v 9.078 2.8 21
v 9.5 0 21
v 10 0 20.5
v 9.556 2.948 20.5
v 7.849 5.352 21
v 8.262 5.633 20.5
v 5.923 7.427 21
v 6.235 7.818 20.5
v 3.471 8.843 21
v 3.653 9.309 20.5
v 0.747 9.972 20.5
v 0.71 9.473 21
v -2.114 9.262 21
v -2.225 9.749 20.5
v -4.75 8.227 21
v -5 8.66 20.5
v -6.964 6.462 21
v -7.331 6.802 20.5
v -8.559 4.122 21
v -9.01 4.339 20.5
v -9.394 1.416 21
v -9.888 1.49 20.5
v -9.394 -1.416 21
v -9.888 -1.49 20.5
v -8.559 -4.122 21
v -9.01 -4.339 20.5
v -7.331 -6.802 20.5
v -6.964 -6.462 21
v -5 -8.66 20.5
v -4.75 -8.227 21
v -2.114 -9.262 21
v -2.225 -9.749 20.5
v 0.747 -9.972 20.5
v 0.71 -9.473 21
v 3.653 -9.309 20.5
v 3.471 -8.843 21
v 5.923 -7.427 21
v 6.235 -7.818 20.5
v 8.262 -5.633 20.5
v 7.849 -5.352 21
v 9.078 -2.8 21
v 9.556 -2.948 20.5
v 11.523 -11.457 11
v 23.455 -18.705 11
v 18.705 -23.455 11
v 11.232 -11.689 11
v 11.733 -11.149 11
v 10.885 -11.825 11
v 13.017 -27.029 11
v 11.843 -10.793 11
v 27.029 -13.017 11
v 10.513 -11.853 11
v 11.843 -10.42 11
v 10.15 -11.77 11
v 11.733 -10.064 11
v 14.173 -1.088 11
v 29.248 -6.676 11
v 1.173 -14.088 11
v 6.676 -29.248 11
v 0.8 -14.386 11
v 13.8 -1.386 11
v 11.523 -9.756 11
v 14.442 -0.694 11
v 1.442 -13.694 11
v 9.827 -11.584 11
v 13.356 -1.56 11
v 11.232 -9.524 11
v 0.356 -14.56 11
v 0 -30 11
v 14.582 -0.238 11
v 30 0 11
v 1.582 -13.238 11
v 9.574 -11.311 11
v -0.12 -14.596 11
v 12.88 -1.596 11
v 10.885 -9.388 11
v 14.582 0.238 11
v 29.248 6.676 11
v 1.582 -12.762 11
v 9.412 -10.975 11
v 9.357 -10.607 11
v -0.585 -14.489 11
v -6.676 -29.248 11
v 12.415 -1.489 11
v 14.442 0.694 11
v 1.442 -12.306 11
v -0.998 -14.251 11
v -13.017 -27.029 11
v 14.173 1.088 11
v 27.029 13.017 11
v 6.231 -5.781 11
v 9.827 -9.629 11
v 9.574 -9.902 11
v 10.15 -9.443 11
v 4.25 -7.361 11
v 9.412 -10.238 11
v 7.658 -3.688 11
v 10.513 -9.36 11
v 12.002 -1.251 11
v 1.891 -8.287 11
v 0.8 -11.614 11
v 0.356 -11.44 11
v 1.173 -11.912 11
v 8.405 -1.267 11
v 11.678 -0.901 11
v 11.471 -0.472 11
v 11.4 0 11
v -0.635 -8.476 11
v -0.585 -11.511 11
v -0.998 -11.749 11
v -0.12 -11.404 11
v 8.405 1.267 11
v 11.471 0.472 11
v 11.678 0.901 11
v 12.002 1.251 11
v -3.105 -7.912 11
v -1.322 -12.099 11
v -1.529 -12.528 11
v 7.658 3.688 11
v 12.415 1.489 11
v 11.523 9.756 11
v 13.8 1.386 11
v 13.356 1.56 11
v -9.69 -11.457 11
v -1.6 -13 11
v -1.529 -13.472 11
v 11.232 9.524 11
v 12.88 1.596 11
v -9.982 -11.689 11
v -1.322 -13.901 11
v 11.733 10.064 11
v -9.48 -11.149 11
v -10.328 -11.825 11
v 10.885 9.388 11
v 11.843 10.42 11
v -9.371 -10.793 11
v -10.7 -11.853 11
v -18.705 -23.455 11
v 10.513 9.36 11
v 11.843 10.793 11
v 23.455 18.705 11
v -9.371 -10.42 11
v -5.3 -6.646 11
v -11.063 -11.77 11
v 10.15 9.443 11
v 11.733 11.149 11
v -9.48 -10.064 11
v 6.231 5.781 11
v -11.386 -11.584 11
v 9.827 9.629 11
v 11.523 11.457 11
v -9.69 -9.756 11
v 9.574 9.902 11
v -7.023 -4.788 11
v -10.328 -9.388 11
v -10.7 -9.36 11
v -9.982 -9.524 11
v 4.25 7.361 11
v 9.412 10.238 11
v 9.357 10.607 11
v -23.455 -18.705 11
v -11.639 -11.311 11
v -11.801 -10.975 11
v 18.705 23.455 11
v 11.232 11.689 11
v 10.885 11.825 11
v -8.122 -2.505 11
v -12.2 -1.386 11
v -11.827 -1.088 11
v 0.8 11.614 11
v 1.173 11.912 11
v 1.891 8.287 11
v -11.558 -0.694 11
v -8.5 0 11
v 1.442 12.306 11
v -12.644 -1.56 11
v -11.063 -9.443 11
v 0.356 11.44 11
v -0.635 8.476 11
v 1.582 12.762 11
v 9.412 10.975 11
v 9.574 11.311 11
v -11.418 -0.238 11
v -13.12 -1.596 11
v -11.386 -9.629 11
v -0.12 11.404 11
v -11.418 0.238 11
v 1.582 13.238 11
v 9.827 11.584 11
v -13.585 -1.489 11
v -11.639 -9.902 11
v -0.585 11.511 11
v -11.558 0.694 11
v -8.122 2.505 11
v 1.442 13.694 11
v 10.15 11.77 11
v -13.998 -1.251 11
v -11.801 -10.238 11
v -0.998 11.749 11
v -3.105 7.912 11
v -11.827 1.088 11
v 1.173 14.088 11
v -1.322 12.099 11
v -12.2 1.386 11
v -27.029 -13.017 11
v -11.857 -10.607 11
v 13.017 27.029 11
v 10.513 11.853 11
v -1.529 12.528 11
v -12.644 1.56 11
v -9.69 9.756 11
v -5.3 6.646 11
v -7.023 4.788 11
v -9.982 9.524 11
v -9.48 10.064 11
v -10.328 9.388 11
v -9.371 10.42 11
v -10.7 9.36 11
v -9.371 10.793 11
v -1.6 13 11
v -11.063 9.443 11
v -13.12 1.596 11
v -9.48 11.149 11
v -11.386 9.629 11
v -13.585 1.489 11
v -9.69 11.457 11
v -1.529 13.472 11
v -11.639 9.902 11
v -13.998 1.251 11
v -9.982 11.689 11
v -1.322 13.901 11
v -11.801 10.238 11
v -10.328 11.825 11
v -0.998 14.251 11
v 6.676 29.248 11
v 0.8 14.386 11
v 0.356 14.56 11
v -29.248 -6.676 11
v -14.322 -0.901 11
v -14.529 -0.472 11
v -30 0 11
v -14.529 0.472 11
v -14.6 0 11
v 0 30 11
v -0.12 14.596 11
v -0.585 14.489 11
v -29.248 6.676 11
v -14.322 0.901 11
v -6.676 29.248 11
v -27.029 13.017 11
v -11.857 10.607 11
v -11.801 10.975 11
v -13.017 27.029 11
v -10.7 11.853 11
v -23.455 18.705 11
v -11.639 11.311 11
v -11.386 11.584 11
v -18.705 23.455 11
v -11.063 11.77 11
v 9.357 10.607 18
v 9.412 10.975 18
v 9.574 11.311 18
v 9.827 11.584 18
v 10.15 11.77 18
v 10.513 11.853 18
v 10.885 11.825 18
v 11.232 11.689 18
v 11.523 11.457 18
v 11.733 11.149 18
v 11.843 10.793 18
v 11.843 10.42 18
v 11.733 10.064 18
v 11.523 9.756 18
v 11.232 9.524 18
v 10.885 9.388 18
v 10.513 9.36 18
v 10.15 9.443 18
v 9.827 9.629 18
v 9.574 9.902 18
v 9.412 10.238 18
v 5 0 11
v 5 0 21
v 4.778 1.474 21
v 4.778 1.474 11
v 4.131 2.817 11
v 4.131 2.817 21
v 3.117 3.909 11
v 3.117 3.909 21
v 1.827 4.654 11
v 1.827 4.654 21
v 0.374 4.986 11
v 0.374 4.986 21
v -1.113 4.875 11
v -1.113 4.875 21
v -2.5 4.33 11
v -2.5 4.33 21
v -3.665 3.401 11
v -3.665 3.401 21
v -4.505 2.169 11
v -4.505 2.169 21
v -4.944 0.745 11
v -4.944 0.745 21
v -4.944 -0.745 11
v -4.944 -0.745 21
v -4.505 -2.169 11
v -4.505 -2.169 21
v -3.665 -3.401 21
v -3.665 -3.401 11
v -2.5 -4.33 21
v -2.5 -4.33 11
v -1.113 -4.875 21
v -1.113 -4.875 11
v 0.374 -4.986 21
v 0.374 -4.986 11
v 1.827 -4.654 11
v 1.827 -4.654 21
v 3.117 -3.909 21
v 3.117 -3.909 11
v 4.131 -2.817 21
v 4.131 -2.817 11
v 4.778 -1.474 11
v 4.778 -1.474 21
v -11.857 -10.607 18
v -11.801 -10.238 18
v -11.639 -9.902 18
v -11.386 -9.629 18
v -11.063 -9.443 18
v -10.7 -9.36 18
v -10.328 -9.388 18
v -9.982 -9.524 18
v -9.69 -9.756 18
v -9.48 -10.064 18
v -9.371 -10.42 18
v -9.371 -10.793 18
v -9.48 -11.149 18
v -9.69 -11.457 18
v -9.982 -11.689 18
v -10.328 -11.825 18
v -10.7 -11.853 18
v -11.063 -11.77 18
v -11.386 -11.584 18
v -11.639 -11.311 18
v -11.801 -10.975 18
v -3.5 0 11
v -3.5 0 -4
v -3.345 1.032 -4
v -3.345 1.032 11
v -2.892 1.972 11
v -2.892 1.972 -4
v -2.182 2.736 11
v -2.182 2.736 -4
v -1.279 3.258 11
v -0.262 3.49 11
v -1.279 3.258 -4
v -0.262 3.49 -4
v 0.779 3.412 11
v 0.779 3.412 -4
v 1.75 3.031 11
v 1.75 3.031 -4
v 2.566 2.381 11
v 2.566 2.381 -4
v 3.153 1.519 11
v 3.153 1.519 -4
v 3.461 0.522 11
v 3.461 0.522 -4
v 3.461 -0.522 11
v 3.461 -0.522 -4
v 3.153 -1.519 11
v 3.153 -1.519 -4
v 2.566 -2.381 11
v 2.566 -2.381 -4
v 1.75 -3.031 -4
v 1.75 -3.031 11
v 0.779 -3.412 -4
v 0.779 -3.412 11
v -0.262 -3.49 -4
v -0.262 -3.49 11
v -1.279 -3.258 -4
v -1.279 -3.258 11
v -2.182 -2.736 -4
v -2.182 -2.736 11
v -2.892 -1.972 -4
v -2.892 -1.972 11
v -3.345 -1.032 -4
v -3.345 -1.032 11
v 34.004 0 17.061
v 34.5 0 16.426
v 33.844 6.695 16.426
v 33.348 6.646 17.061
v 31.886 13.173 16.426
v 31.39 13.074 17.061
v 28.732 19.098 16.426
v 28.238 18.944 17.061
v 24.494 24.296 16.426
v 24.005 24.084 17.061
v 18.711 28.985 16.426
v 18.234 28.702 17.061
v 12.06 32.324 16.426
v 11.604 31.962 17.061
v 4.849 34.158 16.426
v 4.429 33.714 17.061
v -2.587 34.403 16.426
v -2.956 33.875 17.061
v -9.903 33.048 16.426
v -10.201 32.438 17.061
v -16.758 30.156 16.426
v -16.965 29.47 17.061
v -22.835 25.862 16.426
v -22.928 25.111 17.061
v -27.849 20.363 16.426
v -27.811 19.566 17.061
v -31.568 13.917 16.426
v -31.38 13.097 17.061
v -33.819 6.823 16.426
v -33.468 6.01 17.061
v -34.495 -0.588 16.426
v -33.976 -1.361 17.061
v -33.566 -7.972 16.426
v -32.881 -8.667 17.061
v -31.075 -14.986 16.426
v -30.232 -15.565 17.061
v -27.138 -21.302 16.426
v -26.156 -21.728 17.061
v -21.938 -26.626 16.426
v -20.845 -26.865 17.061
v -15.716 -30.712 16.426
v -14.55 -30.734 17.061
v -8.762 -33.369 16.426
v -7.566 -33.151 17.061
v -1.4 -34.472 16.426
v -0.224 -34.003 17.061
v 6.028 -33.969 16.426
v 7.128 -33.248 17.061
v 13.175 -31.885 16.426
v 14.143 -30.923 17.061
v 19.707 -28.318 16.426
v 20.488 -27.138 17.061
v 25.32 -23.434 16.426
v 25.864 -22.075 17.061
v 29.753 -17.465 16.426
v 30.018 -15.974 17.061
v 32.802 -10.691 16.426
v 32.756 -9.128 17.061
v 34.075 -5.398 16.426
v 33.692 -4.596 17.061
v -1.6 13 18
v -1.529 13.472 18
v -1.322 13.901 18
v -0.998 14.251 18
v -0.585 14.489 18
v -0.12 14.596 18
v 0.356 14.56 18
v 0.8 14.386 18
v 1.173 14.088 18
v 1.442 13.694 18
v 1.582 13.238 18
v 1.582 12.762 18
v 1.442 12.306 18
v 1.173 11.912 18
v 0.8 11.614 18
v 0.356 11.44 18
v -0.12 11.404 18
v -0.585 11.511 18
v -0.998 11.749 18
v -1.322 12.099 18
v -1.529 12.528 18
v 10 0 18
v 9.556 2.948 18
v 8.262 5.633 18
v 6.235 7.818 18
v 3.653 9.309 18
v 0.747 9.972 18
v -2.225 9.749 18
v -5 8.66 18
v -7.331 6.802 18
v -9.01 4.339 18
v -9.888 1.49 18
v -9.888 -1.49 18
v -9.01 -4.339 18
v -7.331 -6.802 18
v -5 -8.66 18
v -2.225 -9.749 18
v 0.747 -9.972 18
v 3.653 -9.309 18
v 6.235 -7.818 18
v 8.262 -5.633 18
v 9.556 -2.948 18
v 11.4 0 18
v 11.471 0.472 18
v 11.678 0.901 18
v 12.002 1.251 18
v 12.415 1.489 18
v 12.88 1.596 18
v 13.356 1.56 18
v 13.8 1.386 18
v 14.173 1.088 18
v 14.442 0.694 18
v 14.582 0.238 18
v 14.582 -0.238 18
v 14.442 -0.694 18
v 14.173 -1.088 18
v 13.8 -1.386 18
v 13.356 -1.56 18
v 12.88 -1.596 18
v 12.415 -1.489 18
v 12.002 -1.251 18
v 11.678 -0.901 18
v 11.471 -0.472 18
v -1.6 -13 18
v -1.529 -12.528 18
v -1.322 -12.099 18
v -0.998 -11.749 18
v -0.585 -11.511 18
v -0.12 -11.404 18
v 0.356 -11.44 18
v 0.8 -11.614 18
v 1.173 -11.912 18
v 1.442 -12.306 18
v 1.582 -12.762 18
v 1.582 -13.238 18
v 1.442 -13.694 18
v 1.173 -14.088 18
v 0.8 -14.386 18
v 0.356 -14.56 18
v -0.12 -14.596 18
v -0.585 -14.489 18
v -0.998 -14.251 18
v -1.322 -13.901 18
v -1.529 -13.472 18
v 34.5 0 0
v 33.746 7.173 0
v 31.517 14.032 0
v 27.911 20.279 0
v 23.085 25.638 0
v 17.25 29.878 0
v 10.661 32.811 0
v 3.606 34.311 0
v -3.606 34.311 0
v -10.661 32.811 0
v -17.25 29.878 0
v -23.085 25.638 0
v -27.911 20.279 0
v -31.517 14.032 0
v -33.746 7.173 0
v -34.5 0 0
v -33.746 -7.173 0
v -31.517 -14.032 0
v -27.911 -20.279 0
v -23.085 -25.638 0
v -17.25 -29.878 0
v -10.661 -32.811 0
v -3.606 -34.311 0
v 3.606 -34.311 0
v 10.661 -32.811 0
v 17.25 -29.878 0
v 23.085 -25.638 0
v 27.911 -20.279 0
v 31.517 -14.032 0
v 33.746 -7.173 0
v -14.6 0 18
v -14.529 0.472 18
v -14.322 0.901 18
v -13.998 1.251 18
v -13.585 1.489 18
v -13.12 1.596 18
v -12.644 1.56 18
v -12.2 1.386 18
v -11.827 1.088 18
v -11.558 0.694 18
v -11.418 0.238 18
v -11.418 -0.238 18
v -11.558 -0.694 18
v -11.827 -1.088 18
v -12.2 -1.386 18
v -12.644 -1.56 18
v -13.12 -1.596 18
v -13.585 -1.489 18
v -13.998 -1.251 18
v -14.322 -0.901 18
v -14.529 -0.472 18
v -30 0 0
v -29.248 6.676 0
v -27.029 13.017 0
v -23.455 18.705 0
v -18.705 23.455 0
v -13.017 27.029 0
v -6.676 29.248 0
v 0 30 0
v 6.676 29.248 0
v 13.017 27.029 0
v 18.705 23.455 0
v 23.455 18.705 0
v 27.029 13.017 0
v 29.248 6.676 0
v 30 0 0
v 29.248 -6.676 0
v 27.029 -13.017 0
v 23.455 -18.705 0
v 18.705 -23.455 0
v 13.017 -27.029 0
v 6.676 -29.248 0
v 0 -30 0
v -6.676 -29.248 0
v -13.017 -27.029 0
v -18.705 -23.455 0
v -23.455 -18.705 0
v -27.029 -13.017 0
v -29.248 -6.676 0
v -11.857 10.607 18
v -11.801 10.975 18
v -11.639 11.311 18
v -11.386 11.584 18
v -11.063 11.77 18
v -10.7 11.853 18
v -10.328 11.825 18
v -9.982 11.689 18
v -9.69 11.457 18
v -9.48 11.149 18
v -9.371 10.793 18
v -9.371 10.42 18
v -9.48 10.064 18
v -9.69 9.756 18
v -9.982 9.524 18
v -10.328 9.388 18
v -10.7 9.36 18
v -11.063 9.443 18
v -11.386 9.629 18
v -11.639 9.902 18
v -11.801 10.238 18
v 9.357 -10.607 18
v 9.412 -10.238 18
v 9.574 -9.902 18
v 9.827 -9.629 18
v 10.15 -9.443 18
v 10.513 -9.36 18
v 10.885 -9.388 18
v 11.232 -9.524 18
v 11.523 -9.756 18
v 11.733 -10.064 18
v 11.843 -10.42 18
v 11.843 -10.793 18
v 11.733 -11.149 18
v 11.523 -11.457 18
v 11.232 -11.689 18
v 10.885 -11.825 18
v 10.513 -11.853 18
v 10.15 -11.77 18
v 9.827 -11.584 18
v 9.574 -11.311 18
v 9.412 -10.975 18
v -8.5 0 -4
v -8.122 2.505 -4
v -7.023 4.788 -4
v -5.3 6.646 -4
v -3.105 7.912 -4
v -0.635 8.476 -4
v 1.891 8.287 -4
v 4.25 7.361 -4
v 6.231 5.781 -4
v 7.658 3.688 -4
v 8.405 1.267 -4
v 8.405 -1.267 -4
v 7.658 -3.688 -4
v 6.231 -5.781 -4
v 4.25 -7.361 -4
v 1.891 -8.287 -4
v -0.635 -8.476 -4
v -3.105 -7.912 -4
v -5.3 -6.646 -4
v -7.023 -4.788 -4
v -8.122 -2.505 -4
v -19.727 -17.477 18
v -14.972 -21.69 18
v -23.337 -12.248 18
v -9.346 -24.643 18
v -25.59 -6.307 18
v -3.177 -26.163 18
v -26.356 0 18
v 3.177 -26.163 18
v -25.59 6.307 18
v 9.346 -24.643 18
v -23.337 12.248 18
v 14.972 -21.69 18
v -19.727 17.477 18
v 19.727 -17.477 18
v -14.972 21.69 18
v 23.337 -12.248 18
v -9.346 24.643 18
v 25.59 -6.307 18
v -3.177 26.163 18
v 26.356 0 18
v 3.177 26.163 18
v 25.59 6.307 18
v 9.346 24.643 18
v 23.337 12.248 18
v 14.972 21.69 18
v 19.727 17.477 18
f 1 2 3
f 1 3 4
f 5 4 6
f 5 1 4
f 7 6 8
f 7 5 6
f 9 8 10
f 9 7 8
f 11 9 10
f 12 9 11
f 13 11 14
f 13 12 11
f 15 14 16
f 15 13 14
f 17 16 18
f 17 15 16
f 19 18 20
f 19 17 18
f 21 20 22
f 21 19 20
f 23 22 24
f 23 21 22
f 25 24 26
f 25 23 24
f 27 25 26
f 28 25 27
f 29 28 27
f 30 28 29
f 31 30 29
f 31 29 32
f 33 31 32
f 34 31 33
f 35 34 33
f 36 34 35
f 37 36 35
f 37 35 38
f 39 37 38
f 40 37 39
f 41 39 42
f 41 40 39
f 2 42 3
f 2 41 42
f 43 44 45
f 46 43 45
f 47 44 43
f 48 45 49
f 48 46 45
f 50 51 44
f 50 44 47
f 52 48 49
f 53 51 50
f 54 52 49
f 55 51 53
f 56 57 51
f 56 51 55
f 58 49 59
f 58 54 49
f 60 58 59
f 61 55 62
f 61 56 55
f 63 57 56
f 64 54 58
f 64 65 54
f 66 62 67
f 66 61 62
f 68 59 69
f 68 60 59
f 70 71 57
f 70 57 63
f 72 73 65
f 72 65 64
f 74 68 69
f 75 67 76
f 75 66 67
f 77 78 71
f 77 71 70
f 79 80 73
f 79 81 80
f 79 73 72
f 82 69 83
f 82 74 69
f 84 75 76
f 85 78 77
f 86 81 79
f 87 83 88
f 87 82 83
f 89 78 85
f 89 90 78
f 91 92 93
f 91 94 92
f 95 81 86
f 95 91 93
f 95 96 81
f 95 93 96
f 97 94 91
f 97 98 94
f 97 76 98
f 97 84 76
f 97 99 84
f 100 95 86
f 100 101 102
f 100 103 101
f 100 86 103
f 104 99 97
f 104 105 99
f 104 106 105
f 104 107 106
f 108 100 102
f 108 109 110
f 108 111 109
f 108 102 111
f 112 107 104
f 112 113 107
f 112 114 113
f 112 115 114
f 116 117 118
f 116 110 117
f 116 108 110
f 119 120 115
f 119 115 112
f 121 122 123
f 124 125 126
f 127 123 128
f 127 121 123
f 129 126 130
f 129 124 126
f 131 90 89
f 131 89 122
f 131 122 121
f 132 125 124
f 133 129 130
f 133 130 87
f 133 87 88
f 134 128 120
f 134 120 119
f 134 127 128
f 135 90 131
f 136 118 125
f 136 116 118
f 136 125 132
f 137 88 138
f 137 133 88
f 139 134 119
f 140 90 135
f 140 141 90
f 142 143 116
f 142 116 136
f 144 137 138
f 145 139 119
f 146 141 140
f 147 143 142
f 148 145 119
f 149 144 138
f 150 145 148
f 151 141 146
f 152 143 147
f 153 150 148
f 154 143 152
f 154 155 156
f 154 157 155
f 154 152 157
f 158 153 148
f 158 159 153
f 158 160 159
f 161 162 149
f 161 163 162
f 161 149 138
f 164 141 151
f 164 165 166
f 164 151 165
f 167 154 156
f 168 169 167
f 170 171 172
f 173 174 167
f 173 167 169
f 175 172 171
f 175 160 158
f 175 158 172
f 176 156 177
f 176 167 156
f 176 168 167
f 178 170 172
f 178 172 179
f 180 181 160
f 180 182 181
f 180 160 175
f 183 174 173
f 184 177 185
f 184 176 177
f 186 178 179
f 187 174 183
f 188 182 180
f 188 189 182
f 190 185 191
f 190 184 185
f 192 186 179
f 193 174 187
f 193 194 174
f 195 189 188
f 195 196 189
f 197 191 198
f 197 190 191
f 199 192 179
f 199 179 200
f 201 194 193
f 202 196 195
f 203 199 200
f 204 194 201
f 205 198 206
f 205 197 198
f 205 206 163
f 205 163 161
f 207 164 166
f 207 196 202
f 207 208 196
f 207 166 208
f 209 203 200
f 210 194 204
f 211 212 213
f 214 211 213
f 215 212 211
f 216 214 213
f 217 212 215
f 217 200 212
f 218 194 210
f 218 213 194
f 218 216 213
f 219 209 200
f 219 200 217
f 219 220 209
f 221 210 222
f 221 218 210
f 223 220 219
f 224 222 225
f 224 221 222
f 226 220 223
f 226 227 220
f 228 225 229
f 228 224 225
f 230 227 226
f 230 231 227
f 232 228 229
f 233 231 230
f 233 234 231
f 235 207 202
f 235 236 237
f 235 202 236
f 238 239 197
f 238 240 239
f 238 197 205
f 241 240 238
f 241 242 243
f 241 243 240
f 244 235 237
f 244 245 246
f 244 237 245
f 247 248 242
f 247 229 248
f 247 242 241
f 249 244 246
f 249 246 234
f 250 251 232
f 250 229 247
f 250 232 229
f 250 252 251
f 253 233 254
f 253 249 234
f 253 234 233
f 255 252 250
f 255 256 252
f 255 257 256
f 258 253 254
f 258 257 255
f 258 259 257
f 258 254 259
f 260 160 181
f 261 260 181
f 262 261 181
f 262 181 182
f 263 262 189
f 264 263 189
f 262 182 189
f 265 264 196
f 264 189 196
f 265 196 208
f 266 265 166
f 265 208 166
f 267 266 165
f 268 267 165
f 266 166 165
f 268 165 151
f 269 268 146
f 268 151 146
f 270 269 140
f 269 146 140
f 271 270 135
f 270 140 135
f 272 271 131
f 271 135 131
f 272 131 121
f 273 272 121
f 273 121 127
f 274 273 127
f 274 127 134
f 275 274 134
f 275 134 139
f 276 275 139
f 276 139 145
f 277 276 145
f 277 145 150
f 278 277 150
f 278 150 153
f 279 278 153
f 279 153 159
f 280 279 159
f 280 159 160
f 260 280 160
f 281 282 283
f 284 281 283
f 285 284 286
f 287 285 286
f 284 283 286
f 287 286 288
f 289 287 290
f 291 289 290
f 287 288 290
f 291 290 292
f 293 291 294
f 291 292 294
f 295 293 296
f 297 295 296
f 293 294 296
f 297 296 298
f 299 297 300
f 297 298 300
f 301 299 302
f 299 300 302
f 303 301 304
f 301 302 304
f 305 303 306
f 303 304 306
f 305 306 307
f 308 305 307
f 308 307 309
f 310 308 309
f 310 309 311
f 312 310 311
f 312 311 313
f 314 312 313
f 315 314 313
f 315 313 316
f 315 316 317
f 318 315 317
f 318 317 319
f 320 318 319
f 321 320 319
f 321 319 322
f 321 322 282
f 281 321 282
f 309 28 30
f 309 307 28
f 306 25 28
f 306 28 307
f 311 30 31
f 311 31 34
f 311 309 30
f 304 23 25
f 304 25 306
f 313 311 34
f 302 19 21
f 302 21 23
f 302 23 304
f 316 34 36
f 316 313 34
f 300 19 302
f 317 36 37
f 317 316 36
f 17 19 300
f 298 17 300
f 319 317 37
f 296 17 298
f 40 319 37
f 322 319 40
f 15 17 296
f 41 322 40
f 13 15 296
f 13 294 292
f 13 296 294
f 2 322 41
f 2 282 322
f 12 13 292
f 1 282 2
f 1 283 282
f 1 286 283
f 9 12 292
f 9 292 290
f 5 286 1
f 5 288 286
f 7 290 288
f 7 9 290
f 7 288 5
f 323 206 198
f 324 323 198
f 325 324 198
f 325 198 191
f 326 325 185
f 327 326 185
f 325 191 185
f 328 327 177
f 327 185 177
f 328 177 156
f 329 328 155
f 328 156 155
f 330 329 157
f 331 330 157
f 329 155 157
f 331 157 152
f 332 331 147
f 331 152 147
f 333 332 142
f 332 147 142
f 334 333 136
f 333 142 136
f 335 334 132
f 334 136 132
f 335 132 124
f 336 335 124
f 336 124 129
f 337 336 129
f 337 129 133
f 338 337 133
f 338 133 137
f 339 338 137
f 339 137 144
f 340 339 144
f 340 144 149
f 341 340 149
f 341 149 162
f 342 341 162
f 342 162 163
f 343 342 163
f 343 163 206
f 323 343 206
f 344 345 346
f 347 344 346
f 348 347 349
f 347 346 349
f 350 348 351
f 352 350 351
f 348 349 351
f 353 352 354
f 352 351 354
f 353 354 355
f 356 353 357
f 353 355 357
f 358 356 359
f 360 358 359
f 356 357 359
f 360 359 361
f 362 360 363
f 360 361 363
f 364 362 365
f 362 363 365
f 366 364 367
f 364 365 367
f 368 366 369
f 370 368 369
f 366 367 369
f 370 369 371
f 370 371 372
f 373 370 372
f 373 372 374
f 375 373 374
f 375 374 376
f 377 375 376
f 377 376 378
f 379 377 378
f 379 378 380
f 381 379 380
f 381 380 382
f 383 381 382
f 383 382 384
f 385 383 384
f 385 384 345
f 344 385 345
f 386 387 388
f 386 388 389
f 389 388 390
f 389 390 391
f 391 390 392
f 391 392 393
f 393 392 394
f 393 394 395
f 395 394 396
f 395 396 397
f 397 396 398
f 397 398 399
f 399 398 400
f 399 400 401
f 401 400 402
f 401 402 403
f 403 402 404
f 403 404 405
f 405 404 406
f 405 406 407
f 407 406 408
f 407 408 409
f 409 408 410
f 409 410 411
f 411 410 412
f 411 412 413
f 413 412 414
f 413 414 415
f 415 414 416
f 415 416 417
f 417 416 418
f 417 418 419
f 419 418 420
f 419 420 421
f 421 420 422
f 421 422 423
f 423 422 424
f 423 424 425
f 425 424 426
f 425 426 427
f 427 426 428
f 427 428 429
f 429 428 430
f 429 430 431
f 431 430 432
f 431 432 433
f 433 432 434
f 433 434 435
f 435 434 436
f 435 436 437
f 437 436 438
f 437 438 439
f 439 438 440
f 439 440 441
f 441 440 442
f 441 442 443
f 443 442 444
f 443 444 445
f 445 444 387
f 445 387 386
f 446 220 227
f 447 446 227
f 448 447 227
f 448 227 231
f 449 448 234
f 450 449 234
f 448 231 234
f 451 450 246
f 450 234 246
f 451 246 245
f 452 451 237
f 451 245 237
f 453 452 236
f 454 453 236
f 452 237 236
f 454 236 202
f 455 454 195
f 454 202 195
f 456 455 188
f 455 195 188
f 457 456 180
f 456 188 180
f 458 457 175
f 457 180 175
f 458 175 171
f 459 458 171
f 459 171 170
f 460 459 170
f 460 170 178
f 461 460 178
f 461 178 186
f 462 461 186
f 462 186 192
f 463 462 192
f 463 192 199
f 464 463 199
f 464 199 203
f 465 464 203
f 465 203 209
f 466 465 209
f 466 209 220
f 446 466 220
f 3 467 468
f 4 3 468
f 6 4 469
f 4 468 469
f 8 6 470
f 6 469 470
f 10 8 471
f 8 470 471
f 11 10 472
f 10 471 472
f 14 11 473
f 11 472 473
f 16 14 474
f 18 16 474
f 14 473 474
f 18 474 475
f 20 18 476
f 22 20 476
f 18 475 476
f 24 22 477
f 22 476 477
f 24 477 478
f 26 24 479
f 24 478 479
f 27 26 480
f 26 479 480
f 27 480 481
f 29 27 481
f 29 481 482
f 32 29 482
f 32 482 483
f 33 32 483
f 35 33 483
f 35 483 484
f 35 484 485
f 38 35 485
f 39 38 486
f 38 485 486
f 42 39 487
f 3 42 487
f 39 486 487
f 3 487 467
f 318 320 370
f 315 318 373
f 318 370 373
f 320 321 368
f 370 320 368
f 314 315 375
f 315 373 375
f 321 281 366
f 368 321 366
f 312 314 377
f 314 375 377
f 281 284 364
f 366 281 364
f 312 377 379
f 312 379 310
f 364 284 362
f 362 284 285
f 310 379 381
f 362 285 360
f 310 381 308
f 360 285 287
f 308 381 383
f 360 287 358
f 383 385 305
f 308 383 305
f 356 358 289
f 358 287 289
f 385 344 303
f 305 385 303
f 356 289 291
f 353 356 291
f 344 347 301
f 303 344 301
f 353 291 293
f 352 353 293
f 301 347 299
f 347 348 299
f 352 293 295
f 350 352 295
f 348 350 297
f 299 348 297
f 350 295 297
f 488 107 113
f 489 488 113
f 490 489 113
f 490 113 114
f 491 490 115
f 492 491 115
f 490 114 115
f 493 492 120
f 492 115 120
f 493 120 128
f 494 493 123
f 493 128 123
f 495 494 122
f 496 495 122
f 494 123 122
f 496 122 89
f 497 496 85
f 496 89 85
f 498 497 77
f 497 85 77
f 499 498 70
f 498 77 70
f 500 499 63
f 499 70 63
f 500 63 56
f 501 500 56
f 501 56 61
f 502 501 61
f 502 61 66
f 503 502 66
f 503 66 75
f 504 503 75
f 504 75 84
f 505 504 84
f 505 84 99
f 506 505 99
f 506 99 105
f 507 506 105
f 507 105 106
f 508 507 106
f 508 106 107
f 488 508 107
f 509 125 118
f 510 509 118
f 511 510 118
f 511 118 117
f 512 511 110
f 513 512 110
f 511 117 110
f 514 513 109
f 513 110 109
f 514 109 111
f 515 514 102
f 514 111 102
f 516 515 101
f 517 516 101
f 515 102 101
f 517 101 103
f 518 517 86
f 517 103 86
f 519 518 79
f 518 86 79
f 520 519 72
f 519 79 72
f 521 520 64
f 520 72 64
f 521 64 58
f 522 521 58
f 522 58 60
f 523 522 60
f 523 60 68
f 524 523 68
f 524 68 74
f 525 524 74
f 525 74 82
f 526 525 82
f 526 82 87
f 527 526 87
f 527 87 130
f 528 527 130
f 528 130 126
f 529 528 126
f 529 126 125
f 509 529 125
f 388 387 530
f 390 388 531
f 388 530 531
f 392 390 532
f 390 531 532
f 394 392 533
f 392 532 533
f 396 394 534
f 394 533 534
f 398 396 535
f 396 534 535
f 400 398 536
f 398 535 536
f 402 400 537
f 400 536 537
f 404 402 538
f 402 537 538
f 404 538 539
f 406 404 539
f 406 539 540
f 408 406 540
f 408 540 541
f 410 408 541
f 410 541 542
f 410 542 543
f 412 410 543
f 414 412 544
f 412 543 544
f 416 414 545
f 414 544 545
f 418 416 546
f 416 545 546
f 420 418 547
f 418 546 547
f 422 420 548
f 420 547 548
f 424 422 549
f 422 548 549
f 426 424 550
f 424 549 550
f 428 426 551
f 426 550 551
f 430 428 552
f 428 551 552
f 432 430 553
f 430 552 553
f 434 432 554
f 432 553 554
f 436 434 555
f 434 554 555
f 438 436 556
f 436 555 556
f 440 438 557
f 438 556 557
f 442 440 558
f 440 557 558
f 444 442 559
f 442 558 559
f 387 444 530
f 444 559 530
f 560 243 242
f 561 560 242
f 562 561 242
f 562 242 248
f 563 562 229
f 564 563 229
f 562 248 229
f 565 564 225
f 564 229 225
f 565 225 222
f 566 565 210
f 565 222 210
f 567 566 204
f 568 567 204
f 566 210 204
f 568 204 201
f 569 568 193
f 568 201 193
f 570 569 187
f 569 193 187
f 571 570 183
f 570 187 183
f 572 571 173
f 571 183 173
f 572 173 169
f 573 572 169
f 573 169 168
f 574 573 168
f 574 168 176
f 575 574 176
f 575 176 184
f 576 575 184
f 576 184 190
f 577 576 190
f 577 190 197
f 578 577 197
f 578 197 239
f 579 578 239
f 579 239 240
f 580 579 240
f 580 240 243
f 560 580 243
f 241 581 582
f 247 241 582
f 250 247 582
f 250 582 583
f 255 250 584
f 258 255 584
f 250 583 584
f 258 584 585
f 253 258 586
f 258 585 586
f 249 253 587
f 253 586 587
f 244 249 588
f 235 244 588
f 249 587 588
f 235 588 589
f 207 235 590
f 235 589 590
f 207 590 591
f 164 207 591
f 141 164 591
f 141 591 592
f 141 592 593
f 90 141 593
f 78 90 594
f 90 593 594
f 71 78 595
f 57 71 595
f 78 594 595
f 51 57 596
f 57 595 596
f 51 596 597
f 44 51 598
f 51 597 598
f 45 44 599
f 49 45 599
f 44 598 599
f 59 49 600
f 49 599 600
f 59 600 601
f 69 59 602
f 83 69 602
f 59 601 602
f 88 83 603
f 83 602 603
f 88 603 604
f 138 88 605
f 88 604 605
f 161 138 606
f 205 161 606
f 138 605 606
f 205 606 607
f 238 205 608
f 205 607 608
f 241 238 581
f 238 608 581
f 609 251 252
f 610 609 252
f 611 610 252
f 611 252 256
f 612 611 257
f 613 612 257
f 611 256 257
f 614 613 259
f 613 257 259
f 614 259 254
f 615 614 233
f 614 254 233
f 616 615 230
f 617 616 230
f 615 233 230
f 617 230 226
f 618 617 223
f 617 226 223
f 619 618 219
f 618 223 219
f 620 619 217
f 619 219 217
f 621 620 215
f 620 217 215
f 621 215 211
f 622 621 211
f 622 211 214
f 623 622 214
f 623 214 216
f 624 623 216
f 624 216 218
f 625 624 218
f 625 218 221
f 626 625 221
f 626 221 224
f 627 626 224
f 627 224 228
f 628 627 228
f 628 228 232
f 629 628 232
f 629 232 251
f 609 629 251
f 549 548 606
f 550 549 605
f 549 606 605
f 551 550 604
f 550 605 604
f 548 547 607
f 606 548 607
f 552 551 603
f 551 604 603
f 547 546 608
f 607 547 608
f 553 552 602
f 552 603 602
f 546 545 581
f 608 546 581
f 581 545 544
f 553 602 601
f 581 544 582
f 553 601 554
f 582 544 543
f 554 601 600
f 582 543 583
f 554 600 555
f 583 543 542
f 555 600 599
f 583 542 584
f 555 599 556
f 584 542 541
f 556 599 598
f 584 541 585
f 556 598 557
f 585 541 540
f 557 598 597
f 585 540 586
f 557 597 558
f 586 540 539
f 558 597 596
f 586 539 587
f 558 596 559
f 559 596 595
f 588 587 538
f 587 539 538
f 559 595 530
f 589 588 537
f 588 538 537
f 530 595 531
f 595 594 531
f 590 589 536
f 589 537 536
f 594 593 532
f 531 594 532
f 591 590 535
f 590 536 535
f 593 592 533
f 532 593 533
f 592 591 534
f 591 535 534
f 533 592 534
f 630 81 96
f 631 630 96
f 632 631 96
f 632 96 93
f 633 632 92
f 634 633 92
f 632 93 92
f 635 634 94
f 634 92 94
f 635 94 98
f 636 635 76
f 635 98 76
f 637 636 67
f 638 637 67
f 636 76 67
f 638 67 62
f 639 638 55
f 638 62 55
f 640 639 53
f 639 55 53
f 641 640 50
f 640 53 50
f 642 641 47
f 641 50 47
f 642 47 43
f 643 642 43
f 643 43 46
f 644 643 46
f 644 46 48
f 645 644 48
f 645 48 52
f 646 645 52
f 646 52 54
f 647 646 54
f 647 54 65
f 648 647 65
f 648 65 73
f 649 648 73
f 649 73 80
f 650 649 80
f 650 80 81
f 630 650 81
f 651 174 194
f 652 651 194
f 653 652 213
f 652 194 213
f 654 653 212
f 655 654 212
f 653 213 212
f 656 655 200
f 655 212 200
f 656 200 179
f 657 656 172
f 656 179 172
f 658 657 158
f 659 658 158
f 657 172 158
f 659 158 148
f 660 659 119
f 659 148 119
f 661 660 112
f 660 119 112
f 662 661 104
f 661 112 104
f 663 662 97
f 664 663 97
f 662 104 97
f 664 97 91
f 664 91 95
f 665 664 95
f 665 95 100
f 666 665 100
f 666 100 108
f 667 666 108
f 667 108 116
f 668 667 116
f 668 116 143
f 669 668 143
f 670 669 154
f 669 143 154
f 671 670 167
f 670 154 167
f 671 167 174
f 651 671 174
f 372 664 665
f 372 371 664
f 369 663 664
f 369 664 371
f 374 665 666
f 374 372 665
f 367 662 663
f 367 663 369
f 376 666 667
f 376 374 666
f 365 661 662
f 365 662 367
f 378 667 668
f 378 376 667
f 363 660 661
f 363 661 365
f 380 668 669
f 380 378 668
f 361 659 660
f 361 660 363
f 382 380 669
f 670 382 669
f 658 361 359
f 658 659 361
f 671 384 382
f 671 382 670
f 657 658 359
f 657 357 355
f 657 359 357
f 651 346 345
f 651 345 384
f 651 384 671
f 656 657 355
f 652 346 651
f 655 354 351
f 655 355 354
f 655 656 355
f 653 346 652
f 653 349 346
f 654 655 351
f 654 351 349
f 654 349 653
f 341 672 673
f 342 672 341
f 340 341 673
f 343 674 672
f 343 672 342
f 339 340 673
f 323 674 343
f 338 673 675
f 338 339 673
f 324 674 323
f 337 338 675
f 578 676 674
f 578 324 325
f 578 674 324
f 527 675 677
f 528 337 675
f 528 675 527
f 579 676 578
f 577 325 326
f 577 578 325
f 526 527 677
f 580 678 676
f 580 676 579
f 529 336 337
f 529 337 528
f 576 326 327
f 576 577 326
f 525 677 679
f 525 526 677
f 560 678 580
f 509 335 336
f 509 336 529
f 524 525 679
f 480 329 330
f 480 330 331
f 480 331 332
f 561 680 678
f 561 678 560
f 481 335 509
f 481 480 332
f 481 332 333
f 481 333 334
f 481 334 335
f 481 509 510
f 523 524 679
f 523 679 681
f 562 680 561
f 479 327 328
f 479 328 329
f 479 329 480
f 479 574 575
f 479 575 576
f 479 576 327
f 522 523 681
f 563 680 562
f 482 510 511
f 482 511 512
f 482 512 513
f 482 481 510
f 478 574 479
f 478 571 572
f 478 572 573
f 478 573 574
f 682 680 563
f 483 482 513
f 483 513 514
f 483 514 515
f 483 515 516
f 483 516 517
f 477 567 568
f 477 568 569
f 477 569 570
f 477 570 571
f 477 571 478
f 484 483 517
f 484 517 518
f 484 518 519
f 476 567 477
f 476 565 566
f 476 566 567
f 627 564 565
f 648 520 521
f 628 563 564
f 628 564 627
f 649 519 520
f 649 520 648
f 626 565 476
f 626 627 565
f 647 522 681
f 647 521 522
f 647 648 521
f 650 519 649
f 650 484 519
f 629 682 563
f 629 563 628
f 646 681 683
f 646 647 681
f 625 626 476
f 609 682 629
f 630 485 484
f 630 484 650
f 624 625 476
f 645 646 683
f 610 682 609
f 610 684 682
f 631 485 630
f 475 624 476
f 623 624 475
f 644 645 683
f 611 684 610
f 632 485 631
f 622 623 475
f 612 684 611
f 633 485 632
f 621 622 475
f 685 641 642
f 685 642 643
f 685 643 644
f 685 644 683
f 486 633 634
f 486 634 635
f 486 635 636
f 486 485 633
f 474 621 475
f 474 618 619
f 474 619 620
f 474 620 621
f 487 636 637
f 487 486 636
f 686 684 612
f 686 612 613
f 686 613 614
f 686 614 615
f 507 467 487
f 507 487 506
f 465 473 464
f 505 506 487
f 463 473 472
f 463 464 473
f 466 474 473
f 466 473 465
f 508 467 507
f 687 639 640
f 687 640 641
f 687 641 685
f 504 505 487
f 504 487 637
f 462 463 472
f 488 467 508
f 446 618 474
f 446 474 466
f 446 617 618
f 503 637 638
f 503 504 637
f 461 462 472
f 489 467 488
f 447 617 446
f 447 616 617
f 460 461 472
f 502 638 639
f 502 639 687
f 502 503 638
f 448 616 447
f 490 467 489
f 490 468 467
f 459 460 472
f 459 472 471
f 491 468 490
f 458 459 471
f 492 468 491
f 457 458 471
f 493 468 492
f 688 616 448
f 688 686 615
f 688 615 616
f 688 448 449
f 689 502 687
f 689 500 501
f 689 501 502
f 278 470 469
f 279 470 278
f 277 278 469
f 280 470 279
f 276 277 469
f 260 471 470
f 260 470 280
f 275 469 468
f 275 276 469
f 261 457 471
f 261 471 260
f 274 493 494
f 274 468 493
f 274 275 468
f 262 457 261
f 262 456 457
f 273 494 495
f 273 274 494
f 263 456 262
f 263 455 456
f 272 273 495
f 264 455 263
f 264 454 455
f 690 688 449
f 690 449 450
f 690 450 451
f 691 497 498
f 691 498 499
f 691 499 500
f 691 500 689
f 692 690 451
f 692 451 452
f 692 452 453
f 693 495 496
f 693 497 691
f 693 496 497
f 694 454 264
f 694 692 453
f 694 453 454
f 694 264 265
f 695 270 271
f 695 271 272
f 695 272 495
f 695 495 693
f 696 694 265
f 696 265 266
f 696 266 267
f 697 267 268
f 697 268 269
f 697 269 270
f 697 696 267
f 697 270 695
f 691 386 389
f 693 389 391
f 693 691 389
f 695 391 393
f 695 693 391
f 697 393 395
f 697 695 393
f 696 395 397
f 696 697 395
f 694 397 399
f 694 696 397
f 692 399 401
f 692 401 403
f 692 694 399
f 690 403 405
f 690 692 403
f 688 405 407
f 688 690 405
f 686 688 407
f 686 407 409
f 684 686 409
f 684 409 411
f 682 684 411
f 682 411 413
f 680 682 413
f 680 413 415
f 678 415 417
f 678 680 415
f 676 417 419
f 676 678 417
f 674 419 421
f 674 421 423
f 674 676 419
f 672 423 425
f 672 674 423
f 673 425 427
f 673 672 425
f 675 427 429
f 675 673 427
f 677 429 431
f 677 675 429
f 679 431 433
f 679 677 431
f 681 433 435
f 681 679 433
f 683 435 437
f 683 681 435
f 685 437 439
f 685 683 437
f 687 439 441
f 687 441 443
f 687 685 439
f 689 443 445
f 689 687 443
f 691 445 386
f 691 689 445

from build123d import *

# Parameters (mm, degrees)
SKETCH2_R                  = 34.5
BOSS_EXTRUDE1_DEPTH        = 18
SKETCH3_R                  = 10
BOSS_EXTRUDE2_DEPTH        = 3
CHAMFER1_SIZE              = 1
CHAMFER1_SIZE2             = 8.144346428
SKETCH4_R                  = 5
CUT_EXTRUDE1_DEPTH         = 21
SKETCH5_R                  = 30
CUT_EXTRUDE2_DEPTH         = 11
M3_TAPPED_HOLE1_D          = 2.5
F_3_2_3_2_DIAMETER_HOLE1_D = 3.2
CHAMFER2_SIZE2             = 0.5
CHAMFER2_SIZE              = 0.574265899
CHAMFER2_EDGE_2_SIZE       = 0.5
SKETCH10_R                 = 8.5
BOSS_EXTRUDE3_DEPTH        = 15
CUT_EXTRUDE3_REACH         = 27
SKETCH11_R                 = 3.5


with BuildPart() as part:
    # Sketch2 → Boss-Extrude1 (new body)
    with BuildSketch(Plane.XY):
        Circle(SKETCH2_R)
    extrude(amount=BOSS_EXTRUDE1_DEPTH)

    # Sketch3 → Boss-Extrude2 (add)
    with BuildSketch(Plane.XY.offset(18)):
        Circle(SKETCH3_R)
    extrude(amount=BOSS_EXTRUDE2_DEPTH)

    # Chamfer1
    chamfer1_edges = [part.edges().sort_by_distance(p)[0] for p in [
        (-34.5, 0, 18),
    ]]
    chamfer1_side = [part.faces().sort_by_distance(p)[0] for p in [
        (-34.5, 0, 9),
    ]]
    chamfer(chamfer1_edges, length=CHAMFER1_SIZE, length2=CHAMFER1_SIZE2, reference=chamfer1_side[0])

    # Sketch4 → Cut-Extrude1 (cut)
    with BuildSketch(Plane.XY.offset(21)):
        Circle(SKETCH4_R)
    extrude(amount=-CUT_EXTRUDE1_DEPTH, mode=Mode.SUBTRACT)

    # Sketch5 → Cut-Extrude2 (cut)
    with BuildSketch(Plane(origin=(0, 0, 0), x_dir=(-1, 0, 0), z_dir=(0, 0, -1))):
        Circle(SKETCH5_R)
    extrude(amount=-CUT_EXTRUDE2_DEPTH, mode=Mode.SUBTRACT)

    # M3 Tapped Hole1 (through all)
    with Locations(Plane.XY.offset(18)):
        with Locations((10.606601718, 10.606601718), (10.606601718, -10.606601718), (-10.606601718, -10.606601718), (-10.606601718, 10.606601718)):
            Hole(M3_TAPPED_HOLE1_D / 2)

    # Ø3.2 (3.2) Diameter Hole1 (through all)
    with Locations(Plane.XY.offset(18)):
        with Locations((13, 0), (-13, 0), (0, 13), (0, -13)):
            Hole(F_3_2_3_2_DIAMETER_HOLE1_D / 2)

    # Chamfer2
    chamfer2_edges = [part.edges().sort_by_distance(p)[0] for p in [
        (-34.5, 0, 17),
    ]]
    chamfer(chamfer2_edges, length=CHAMFER2_SIZE, length2=CHAMFER2_SIZE2)

    # Chamfer2 edge 2
    chamfer2_edge_2_edges = [part.edges().sort_by_distance(p)[0] for p in [
        (-10, 0, 21),
    ]]
    chamfer(chamfer2_edge_2_edges, length=CHAMFER2_EDGE_2_SIZE)

    # Sketch10 → Boss-Extrude3 (add)
    with BuildSketch(Plane(origin=(0, 0, 11), x_dir=(-1, 0, 0), z_dir=(0, 0, -1))):
        Circle(SKETCH10_R)
    extrude(amount=BOSS_EXTRUDE3_DEPTH)

    # Sketch11 → Cut-Extrude3 (cut, up to next)
    with BuildSketch(Plane(origin=(0, 0, -4), x_dir=(-1, 0, 0), z_dir=(0, 0, -1)), mode=Mode.PRIVATE) as cut_extrude3_sk1:
        Circle(SKETCH11_R)
    cut_extrude3_tool1 = extrude(cut_extrude3_sk1.sketch, amount=-CUT_EXTRUDE3_REACH, mode=Mode.PRIVATE) & part.part
    add(cut_extrude3_tool1.solids().sort_by_distance((0, 0, -4))[0], mode=Mode.SUBTRACT)


solid = part.part
